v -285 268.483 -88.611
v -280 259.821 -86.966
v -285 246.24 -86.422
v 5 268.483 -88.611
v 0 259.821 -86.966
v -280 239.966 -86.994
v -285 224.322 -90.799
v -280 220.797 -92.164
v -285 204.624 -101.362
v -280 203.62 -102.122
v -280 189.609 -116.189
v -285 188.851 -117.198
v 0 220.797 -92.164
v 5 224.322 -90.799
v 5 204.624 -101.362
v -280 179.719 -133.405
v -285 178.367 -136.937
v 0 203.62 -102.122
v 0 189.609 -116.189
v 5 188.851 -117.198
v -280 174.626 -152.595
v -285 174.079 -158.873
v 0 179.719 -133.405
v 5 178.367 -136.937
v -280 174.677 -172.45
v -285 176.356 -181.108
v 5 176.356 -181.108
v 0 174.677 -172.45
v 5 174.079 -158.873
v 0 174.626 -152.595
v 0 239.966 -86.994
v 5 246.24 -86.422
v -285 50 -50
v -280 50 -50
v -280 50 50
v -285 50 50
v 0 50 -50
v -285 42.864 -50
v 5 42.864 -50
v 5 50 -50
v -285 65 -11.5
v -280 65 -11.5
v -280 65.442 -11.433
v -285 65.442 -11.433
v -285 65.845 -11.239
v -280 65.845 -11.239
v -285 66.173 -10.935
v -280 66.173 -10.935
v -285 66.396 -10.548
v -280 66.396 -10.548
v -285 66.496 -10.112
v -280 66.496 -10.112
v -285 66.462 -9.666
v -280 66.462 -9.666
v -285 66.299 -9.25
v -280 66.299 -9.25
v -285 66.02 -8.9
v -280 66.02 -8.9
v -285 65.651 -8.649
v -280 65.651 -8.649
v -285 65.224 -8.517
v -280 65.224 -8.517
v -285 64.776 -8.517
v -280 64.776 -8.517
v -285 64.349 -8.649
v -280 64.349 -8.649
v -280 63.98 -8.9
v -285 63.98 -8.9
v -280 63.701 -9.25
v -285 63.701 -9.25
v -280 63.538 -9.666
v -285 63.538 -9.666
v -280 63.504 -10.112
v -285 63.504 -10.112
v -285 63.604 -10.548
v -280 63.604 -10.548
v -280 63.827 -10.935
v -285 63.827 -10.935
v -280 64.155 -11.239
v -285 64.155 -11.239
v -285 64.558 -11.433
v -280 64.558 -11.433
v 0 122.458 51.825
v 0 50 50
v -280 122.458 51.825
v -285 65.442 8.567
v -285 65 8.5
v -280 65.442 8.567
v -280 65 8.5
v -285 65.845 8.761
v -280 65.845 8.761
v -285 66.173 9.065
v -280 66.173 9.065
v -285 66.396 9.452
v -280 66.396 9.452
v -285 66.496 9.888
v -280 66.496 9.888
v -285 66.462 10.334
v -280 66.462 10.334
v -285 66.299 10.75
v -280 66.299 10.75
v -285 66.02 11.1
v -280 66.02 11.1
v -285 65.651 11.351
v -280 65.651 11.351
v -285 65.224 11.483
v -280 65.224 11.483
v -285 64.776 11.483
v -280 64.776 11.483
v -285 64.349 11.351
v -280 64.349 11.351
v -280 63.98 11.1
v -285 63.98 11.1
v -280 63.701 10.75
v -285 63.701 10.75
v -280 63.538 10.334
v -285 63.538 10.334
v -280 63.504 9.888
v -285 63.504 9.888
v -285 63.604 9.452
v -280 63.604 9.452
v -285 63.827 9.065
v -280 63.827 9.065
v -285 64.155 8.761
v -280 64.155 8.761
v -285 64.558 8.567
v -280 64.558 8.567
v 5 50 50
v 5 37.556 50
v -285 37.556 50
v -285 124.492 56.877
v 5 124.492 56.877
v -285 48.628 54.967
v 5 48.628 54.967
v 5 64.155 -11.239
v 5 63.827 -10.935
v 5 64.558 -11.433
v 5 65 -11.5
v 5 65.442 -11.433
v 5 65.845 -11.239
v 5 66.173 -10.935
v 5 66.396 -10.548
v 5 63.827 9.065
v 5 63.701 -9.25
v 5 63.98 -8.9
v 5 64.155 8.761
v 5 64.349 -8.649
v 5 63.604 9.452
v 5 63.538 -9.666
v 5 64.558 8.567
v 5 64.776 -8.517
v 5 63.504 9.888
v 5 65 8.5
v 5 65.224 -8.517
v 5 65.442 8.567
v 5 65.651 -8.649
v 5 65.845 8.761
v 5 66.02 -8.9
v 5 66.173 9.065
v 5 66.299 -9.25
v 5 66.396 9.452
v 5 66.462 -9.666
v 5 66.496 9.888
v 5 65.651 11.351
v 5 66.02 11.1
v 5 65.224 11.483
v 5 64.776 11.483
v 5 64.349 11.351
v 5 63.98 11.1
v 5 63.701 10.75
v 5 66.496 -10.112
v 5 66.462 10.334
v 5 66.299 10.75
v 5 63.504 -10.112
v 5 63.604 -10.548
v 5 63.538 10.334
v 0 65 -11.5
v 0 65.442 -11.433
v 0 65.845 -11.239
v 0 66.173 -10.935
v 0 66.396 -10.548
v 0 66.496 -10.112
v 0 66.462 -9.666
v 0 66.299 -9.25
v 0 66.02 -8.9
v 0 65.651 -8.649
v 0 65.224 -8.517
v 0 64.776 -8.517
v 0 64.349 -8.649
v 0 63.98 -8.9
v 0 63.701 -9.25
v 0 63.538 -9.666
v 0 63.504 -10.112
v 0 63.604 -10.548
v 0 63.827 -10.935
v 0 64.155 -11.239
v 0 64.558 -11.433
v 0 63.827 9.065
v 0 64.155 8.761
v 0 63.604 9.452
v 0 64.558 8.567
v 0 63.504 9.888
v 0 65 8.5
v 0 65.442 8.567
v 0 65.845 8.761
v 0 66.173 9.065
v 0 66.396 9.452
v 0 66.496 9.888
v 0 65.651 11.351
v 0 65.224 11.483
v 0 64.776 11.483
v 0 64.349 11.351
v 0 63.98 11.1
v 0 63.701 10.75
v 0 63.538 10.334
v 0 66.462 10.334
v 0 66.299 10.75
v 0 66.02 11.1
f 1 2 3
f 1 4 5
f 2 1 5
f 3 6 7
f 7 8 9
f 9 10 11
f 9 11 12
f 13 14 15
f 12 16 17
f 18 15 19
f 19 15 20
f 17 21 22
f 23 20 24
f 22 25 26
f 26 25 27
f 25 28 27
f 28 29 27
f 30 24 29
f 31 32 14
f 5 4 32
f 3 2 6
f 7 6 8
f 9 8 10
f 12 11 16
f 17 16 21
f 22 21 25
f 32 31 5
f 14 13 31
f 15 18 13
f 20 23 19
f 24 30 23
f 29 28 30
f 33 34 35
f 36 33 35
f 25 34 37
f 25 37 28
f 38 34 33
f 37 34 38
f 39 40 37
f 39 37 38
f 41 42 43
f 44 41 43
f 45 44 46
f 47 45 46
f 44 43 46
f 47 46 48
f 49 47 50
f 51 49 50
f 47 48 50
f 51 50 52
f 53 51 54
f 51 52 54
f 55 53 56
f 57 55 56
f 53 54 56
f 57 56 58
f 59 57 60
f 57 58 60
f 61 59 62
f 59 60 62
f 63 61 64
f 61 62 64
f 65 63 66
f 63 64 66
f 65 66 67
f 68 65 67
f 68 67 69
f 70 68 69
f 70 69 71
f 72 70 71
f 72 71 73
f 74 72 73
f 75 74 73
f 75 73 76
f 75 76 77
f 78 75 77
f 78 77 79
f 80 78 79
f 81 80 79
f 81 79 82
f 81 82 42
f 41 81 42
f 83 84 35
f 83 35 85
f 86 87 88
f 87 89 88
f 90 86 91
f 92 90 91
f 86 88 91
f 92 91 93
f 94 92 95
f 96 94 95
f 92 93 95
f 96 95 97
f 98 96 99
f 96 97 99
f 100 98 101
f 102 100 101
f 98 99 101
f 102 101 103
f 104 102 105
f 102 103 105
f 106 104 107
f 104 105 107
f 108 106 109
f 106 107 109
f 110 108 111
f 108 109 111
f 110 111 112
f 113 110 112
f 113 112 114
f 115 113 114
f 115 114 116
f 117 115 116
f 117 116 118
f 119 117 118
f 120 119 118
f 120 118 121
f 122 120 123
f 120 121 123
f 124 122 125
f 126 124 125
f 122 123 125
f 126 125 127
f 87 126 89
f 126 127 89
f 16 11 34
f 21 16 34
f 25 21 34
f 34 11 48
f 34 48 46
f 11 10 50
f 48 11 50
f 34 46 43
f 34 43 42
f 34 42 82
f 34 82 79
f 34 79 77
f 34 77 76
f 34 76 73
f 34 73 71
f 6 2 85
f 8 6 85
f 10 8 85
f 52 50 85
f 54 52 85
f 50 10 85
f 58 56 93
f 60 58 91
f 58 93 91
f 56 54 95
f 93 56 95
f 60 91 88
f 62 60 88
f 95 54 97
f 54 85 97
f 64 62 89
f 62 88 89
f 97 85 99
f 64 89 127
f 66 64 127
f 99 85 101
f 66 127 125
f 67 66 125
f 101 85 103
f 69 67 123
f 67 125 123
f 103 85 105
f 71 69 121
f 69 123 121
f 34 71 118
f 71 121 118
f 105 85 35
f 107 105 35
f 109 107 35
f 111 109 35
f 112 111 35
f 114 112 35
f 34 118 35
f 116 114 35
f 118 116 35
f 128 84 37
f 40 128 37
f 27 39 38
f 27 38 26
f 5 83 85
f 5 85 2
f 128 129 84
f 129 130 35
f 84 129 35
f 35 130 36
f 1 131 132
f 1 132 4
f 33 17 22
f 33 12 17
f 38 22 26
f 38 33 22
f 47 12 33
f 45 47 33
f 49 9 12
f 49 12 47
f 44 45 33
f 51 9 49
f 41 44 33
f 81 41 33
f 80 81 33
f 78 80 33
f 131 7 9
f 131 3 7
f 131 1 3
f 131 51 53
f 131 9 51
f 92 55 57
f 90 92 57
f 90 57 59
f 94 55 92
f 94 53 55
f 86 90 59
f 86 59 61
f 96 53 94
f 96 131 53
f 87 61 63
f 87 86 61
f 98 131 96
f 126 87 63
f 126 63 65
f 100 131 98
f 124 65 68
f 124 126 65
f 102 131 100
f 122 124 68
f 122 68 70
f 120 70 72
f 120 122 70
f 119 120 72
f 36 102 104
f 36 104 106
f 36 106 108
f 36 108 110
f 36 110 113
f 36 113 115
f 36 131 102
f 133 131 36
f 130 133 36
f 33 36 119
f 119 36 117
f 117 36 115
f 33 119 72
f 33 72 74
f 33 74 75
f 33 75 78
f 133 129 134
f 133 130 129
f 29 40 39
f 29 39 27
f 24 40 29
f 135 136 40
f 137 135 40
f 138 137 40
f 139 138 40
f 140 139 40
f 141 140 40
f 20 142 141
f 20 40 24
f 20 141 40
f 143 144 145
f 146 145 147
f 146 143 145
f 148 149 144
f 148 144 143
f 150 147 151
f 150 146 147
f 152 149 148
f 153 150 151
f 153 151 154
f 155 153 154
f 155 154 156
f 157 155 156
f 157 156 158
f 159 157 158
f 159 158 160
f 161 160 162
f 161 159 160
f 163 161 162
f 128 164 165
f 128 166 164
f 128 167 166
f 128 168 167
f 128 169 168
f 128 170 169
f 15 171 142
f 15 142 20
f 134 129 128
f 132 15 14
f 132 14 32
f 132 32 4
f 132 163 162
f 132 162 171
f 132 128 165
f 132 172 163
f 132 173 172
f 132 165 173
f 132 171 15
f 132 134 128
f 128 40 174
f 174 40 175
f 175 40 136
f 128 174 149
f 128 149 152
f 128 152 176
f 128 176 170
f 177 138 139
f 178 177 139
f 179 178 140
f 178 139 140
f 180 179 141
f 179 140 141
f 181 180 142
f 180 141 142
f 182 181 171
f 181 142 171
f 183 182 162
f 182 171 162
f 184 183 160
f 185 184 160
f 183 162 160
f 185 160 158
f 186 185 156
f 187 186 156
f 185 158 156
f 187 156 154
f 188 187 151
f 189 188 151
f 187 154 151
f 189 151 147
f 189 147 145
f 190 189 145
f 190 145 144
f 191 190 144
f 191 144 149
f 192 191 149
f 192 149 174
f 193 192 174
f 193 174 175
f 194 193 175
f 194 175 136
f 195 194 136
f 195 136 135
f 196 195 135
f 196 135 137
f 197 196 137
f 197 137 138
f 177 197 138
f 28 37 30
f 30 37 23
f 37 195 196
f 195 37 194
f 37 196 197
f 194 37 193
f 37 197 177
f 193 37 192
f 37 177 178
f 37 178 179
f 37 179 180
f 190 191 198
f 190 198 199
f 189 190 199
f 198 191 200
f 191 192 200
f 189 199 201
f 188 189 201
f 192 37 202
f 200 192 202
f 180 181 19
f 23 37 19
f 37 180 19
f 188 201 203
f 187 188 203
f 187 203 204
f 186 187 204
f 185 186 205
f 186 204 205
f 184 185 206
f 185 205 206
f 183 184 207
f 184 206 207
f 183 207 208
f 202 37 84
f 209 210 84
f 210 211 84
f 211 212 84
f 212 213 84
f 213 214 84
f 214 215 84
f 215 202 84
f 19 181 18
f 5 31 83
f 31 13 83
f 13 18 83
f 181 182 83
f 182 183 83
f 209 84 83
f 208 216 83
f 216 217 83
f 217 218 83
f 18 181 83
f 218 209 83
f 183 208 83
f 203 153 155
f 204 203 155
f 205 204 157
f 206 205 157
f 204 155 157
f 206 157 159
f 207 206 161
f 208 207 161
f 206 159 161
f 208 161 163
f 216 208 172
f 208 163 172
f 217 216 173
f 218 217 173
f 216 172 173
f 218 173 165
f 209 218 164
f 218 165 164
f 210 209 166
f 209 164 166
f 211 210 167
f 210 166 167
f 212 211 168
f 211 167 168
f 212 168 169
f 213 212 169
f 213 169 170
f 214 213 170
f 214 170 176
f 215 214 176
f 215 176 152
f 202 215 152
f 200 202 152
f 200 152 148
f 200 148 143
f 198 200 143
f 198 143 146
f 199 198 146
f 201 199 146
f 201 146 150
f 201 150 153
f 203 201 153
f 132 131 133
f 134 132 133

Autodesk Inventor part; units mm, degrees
ref_plane "YZ Plane" through (0, 0, 0) normal (1, 0, 0) x (0, 1, 0)
ref_plane "XZ Plane" through (0, 0, 0) normal (0, 1, 0) x (-1, 0, 0)
ref_plane "XY Plane" through (0, 0, 0) normal (0, 0, 1) x (1, 0, 0)
sketch "Sketch1" plane through (0, 0, 0) normal (1, 0, 0) x (0, 1, 0)
  line L0 (42.8643, -50) -> (204.4541, -208.7035)
  line L1 (0, 0) -> (0, -50)
  line L2 (124.4924, 56.8774) -> (295.5459, -115.955)
  line L3 (122.4584, 51.8246) -> (292.042, -119.5226)
  line L4 (50, -50) -> (207.9576, -205.1362)
  line L5 (295.5459, -115.955) -> (204.4541, -208.7035)
  circle A0 centre (250, -162.3292) radius 10
  circle A1 centre (250, -162.3292) radius 76
  line L6 (124.4924, 56.8774) -> (-148.62, 50)
  line L7 (50, 50) -> (122.4584, 51.8246)
  line L8 (0, 0) -> (0, -77.5)
  line L9 (-50, 50) -> (50, 50)
  line L10 (50, 50) -> (50, -50)
  line L11 (50, -50) -> (-50, -50)
  line L12 (-50, -50) -> (-50, 50)
  line L13 (-50, 50) -> (50, -50) construction
  line L14 (50, 50) -> (-50, -50) construction
  line L15 (37.5556, 50) -> (48.6277, 54.967)
  point P0 (22.0043, 0)
  point P1 (259.821, -86.9665)
  point P2 (268.4835, -88.6111)
  point P3 (176.3565, -181.1077)
  point P4 (174.6769, -172.4499)
  point P5 (242.9929, -169.4637)
  point P6 (257.0071, -155.1947)
  dimension "d6" = 5
  dimension "d7" = 5
  dimension "d8" = 90
  dimension "d9" = 130
  dimension "d11" = 50
  dimension "d14" = 20
  dimension "d16" = 152
  dimension "d17" = 250
  dimension "d18" = 5
  dimension "d24" = 77.5
  dimension "d26" = 264
  dimension "d29" = 100
  dimension "d30" = 100
extrude "Extrusion1" add sketch "Sketch1" against normal blind 280 contours L11 L4 A1 L0 | L9 L15 L6 L2 A1 L3 L7
extrude "Extrusion2" add sketch "Sketch1" along normal blind 5 contours L11 L4 A1 L0 | L10 L7 L3 A1 L4 | L9 L15 L6 L2 A1 L3 L7
ref_plane "Work Plane1" through (-140, 0, 0) normal (-1, 0, 0) x (0, 0, 1)
mirror "Mirror1" about plane through (-140, 0, 0) normal (-1, 0, 0) of "Extrusion2"
sketch "Sketch4" plane through (5, 0, 0) normal (1, 0, 0) x (0, 0, -1)
  arc A0 (88.6111, 268.4835) -> (181.1077, 176.3565) centre (162.3292, 250) ccw projected
  line L0 (88.6111, 268.4835) -> (-56.8774, 124.4924) projected
  line L1 (-56.8774, 124.4924) -> (-54.967, 48.6277) projected
  line L2 (-54.967, 48.6277) -> (-50, 37.5556) projected
  line L3 (-50, 37.5556) -> (-50, 50) projected
  line L4 (-50, 50) -> (50, 50) projected
  line L5 (50, 50) -> (50, 42.8643) projected
  line L6 (50, 42.8643) -> (181.1077, 176.3565) projected
  circle A1 centre (-10, 65) radius 1.5
  circle A2 centre (10, 65) radius 1.5
  line L7 (-10, 65) -> (10, 65)
  point P0 (0, 0)
  point P1 (0, 65)
  point P2 (0, 50)
  dimension "d31" = 15
  dimension "d32" = 3
  dimension "d33" = 3
  dimension "d34" = 20
extrude "Extrusion5" cut sketch "Sketch4" against normal through all contours A1 | A2
properties part number "CANALETA_GUIA" material "Steel, Mild, Welded"
